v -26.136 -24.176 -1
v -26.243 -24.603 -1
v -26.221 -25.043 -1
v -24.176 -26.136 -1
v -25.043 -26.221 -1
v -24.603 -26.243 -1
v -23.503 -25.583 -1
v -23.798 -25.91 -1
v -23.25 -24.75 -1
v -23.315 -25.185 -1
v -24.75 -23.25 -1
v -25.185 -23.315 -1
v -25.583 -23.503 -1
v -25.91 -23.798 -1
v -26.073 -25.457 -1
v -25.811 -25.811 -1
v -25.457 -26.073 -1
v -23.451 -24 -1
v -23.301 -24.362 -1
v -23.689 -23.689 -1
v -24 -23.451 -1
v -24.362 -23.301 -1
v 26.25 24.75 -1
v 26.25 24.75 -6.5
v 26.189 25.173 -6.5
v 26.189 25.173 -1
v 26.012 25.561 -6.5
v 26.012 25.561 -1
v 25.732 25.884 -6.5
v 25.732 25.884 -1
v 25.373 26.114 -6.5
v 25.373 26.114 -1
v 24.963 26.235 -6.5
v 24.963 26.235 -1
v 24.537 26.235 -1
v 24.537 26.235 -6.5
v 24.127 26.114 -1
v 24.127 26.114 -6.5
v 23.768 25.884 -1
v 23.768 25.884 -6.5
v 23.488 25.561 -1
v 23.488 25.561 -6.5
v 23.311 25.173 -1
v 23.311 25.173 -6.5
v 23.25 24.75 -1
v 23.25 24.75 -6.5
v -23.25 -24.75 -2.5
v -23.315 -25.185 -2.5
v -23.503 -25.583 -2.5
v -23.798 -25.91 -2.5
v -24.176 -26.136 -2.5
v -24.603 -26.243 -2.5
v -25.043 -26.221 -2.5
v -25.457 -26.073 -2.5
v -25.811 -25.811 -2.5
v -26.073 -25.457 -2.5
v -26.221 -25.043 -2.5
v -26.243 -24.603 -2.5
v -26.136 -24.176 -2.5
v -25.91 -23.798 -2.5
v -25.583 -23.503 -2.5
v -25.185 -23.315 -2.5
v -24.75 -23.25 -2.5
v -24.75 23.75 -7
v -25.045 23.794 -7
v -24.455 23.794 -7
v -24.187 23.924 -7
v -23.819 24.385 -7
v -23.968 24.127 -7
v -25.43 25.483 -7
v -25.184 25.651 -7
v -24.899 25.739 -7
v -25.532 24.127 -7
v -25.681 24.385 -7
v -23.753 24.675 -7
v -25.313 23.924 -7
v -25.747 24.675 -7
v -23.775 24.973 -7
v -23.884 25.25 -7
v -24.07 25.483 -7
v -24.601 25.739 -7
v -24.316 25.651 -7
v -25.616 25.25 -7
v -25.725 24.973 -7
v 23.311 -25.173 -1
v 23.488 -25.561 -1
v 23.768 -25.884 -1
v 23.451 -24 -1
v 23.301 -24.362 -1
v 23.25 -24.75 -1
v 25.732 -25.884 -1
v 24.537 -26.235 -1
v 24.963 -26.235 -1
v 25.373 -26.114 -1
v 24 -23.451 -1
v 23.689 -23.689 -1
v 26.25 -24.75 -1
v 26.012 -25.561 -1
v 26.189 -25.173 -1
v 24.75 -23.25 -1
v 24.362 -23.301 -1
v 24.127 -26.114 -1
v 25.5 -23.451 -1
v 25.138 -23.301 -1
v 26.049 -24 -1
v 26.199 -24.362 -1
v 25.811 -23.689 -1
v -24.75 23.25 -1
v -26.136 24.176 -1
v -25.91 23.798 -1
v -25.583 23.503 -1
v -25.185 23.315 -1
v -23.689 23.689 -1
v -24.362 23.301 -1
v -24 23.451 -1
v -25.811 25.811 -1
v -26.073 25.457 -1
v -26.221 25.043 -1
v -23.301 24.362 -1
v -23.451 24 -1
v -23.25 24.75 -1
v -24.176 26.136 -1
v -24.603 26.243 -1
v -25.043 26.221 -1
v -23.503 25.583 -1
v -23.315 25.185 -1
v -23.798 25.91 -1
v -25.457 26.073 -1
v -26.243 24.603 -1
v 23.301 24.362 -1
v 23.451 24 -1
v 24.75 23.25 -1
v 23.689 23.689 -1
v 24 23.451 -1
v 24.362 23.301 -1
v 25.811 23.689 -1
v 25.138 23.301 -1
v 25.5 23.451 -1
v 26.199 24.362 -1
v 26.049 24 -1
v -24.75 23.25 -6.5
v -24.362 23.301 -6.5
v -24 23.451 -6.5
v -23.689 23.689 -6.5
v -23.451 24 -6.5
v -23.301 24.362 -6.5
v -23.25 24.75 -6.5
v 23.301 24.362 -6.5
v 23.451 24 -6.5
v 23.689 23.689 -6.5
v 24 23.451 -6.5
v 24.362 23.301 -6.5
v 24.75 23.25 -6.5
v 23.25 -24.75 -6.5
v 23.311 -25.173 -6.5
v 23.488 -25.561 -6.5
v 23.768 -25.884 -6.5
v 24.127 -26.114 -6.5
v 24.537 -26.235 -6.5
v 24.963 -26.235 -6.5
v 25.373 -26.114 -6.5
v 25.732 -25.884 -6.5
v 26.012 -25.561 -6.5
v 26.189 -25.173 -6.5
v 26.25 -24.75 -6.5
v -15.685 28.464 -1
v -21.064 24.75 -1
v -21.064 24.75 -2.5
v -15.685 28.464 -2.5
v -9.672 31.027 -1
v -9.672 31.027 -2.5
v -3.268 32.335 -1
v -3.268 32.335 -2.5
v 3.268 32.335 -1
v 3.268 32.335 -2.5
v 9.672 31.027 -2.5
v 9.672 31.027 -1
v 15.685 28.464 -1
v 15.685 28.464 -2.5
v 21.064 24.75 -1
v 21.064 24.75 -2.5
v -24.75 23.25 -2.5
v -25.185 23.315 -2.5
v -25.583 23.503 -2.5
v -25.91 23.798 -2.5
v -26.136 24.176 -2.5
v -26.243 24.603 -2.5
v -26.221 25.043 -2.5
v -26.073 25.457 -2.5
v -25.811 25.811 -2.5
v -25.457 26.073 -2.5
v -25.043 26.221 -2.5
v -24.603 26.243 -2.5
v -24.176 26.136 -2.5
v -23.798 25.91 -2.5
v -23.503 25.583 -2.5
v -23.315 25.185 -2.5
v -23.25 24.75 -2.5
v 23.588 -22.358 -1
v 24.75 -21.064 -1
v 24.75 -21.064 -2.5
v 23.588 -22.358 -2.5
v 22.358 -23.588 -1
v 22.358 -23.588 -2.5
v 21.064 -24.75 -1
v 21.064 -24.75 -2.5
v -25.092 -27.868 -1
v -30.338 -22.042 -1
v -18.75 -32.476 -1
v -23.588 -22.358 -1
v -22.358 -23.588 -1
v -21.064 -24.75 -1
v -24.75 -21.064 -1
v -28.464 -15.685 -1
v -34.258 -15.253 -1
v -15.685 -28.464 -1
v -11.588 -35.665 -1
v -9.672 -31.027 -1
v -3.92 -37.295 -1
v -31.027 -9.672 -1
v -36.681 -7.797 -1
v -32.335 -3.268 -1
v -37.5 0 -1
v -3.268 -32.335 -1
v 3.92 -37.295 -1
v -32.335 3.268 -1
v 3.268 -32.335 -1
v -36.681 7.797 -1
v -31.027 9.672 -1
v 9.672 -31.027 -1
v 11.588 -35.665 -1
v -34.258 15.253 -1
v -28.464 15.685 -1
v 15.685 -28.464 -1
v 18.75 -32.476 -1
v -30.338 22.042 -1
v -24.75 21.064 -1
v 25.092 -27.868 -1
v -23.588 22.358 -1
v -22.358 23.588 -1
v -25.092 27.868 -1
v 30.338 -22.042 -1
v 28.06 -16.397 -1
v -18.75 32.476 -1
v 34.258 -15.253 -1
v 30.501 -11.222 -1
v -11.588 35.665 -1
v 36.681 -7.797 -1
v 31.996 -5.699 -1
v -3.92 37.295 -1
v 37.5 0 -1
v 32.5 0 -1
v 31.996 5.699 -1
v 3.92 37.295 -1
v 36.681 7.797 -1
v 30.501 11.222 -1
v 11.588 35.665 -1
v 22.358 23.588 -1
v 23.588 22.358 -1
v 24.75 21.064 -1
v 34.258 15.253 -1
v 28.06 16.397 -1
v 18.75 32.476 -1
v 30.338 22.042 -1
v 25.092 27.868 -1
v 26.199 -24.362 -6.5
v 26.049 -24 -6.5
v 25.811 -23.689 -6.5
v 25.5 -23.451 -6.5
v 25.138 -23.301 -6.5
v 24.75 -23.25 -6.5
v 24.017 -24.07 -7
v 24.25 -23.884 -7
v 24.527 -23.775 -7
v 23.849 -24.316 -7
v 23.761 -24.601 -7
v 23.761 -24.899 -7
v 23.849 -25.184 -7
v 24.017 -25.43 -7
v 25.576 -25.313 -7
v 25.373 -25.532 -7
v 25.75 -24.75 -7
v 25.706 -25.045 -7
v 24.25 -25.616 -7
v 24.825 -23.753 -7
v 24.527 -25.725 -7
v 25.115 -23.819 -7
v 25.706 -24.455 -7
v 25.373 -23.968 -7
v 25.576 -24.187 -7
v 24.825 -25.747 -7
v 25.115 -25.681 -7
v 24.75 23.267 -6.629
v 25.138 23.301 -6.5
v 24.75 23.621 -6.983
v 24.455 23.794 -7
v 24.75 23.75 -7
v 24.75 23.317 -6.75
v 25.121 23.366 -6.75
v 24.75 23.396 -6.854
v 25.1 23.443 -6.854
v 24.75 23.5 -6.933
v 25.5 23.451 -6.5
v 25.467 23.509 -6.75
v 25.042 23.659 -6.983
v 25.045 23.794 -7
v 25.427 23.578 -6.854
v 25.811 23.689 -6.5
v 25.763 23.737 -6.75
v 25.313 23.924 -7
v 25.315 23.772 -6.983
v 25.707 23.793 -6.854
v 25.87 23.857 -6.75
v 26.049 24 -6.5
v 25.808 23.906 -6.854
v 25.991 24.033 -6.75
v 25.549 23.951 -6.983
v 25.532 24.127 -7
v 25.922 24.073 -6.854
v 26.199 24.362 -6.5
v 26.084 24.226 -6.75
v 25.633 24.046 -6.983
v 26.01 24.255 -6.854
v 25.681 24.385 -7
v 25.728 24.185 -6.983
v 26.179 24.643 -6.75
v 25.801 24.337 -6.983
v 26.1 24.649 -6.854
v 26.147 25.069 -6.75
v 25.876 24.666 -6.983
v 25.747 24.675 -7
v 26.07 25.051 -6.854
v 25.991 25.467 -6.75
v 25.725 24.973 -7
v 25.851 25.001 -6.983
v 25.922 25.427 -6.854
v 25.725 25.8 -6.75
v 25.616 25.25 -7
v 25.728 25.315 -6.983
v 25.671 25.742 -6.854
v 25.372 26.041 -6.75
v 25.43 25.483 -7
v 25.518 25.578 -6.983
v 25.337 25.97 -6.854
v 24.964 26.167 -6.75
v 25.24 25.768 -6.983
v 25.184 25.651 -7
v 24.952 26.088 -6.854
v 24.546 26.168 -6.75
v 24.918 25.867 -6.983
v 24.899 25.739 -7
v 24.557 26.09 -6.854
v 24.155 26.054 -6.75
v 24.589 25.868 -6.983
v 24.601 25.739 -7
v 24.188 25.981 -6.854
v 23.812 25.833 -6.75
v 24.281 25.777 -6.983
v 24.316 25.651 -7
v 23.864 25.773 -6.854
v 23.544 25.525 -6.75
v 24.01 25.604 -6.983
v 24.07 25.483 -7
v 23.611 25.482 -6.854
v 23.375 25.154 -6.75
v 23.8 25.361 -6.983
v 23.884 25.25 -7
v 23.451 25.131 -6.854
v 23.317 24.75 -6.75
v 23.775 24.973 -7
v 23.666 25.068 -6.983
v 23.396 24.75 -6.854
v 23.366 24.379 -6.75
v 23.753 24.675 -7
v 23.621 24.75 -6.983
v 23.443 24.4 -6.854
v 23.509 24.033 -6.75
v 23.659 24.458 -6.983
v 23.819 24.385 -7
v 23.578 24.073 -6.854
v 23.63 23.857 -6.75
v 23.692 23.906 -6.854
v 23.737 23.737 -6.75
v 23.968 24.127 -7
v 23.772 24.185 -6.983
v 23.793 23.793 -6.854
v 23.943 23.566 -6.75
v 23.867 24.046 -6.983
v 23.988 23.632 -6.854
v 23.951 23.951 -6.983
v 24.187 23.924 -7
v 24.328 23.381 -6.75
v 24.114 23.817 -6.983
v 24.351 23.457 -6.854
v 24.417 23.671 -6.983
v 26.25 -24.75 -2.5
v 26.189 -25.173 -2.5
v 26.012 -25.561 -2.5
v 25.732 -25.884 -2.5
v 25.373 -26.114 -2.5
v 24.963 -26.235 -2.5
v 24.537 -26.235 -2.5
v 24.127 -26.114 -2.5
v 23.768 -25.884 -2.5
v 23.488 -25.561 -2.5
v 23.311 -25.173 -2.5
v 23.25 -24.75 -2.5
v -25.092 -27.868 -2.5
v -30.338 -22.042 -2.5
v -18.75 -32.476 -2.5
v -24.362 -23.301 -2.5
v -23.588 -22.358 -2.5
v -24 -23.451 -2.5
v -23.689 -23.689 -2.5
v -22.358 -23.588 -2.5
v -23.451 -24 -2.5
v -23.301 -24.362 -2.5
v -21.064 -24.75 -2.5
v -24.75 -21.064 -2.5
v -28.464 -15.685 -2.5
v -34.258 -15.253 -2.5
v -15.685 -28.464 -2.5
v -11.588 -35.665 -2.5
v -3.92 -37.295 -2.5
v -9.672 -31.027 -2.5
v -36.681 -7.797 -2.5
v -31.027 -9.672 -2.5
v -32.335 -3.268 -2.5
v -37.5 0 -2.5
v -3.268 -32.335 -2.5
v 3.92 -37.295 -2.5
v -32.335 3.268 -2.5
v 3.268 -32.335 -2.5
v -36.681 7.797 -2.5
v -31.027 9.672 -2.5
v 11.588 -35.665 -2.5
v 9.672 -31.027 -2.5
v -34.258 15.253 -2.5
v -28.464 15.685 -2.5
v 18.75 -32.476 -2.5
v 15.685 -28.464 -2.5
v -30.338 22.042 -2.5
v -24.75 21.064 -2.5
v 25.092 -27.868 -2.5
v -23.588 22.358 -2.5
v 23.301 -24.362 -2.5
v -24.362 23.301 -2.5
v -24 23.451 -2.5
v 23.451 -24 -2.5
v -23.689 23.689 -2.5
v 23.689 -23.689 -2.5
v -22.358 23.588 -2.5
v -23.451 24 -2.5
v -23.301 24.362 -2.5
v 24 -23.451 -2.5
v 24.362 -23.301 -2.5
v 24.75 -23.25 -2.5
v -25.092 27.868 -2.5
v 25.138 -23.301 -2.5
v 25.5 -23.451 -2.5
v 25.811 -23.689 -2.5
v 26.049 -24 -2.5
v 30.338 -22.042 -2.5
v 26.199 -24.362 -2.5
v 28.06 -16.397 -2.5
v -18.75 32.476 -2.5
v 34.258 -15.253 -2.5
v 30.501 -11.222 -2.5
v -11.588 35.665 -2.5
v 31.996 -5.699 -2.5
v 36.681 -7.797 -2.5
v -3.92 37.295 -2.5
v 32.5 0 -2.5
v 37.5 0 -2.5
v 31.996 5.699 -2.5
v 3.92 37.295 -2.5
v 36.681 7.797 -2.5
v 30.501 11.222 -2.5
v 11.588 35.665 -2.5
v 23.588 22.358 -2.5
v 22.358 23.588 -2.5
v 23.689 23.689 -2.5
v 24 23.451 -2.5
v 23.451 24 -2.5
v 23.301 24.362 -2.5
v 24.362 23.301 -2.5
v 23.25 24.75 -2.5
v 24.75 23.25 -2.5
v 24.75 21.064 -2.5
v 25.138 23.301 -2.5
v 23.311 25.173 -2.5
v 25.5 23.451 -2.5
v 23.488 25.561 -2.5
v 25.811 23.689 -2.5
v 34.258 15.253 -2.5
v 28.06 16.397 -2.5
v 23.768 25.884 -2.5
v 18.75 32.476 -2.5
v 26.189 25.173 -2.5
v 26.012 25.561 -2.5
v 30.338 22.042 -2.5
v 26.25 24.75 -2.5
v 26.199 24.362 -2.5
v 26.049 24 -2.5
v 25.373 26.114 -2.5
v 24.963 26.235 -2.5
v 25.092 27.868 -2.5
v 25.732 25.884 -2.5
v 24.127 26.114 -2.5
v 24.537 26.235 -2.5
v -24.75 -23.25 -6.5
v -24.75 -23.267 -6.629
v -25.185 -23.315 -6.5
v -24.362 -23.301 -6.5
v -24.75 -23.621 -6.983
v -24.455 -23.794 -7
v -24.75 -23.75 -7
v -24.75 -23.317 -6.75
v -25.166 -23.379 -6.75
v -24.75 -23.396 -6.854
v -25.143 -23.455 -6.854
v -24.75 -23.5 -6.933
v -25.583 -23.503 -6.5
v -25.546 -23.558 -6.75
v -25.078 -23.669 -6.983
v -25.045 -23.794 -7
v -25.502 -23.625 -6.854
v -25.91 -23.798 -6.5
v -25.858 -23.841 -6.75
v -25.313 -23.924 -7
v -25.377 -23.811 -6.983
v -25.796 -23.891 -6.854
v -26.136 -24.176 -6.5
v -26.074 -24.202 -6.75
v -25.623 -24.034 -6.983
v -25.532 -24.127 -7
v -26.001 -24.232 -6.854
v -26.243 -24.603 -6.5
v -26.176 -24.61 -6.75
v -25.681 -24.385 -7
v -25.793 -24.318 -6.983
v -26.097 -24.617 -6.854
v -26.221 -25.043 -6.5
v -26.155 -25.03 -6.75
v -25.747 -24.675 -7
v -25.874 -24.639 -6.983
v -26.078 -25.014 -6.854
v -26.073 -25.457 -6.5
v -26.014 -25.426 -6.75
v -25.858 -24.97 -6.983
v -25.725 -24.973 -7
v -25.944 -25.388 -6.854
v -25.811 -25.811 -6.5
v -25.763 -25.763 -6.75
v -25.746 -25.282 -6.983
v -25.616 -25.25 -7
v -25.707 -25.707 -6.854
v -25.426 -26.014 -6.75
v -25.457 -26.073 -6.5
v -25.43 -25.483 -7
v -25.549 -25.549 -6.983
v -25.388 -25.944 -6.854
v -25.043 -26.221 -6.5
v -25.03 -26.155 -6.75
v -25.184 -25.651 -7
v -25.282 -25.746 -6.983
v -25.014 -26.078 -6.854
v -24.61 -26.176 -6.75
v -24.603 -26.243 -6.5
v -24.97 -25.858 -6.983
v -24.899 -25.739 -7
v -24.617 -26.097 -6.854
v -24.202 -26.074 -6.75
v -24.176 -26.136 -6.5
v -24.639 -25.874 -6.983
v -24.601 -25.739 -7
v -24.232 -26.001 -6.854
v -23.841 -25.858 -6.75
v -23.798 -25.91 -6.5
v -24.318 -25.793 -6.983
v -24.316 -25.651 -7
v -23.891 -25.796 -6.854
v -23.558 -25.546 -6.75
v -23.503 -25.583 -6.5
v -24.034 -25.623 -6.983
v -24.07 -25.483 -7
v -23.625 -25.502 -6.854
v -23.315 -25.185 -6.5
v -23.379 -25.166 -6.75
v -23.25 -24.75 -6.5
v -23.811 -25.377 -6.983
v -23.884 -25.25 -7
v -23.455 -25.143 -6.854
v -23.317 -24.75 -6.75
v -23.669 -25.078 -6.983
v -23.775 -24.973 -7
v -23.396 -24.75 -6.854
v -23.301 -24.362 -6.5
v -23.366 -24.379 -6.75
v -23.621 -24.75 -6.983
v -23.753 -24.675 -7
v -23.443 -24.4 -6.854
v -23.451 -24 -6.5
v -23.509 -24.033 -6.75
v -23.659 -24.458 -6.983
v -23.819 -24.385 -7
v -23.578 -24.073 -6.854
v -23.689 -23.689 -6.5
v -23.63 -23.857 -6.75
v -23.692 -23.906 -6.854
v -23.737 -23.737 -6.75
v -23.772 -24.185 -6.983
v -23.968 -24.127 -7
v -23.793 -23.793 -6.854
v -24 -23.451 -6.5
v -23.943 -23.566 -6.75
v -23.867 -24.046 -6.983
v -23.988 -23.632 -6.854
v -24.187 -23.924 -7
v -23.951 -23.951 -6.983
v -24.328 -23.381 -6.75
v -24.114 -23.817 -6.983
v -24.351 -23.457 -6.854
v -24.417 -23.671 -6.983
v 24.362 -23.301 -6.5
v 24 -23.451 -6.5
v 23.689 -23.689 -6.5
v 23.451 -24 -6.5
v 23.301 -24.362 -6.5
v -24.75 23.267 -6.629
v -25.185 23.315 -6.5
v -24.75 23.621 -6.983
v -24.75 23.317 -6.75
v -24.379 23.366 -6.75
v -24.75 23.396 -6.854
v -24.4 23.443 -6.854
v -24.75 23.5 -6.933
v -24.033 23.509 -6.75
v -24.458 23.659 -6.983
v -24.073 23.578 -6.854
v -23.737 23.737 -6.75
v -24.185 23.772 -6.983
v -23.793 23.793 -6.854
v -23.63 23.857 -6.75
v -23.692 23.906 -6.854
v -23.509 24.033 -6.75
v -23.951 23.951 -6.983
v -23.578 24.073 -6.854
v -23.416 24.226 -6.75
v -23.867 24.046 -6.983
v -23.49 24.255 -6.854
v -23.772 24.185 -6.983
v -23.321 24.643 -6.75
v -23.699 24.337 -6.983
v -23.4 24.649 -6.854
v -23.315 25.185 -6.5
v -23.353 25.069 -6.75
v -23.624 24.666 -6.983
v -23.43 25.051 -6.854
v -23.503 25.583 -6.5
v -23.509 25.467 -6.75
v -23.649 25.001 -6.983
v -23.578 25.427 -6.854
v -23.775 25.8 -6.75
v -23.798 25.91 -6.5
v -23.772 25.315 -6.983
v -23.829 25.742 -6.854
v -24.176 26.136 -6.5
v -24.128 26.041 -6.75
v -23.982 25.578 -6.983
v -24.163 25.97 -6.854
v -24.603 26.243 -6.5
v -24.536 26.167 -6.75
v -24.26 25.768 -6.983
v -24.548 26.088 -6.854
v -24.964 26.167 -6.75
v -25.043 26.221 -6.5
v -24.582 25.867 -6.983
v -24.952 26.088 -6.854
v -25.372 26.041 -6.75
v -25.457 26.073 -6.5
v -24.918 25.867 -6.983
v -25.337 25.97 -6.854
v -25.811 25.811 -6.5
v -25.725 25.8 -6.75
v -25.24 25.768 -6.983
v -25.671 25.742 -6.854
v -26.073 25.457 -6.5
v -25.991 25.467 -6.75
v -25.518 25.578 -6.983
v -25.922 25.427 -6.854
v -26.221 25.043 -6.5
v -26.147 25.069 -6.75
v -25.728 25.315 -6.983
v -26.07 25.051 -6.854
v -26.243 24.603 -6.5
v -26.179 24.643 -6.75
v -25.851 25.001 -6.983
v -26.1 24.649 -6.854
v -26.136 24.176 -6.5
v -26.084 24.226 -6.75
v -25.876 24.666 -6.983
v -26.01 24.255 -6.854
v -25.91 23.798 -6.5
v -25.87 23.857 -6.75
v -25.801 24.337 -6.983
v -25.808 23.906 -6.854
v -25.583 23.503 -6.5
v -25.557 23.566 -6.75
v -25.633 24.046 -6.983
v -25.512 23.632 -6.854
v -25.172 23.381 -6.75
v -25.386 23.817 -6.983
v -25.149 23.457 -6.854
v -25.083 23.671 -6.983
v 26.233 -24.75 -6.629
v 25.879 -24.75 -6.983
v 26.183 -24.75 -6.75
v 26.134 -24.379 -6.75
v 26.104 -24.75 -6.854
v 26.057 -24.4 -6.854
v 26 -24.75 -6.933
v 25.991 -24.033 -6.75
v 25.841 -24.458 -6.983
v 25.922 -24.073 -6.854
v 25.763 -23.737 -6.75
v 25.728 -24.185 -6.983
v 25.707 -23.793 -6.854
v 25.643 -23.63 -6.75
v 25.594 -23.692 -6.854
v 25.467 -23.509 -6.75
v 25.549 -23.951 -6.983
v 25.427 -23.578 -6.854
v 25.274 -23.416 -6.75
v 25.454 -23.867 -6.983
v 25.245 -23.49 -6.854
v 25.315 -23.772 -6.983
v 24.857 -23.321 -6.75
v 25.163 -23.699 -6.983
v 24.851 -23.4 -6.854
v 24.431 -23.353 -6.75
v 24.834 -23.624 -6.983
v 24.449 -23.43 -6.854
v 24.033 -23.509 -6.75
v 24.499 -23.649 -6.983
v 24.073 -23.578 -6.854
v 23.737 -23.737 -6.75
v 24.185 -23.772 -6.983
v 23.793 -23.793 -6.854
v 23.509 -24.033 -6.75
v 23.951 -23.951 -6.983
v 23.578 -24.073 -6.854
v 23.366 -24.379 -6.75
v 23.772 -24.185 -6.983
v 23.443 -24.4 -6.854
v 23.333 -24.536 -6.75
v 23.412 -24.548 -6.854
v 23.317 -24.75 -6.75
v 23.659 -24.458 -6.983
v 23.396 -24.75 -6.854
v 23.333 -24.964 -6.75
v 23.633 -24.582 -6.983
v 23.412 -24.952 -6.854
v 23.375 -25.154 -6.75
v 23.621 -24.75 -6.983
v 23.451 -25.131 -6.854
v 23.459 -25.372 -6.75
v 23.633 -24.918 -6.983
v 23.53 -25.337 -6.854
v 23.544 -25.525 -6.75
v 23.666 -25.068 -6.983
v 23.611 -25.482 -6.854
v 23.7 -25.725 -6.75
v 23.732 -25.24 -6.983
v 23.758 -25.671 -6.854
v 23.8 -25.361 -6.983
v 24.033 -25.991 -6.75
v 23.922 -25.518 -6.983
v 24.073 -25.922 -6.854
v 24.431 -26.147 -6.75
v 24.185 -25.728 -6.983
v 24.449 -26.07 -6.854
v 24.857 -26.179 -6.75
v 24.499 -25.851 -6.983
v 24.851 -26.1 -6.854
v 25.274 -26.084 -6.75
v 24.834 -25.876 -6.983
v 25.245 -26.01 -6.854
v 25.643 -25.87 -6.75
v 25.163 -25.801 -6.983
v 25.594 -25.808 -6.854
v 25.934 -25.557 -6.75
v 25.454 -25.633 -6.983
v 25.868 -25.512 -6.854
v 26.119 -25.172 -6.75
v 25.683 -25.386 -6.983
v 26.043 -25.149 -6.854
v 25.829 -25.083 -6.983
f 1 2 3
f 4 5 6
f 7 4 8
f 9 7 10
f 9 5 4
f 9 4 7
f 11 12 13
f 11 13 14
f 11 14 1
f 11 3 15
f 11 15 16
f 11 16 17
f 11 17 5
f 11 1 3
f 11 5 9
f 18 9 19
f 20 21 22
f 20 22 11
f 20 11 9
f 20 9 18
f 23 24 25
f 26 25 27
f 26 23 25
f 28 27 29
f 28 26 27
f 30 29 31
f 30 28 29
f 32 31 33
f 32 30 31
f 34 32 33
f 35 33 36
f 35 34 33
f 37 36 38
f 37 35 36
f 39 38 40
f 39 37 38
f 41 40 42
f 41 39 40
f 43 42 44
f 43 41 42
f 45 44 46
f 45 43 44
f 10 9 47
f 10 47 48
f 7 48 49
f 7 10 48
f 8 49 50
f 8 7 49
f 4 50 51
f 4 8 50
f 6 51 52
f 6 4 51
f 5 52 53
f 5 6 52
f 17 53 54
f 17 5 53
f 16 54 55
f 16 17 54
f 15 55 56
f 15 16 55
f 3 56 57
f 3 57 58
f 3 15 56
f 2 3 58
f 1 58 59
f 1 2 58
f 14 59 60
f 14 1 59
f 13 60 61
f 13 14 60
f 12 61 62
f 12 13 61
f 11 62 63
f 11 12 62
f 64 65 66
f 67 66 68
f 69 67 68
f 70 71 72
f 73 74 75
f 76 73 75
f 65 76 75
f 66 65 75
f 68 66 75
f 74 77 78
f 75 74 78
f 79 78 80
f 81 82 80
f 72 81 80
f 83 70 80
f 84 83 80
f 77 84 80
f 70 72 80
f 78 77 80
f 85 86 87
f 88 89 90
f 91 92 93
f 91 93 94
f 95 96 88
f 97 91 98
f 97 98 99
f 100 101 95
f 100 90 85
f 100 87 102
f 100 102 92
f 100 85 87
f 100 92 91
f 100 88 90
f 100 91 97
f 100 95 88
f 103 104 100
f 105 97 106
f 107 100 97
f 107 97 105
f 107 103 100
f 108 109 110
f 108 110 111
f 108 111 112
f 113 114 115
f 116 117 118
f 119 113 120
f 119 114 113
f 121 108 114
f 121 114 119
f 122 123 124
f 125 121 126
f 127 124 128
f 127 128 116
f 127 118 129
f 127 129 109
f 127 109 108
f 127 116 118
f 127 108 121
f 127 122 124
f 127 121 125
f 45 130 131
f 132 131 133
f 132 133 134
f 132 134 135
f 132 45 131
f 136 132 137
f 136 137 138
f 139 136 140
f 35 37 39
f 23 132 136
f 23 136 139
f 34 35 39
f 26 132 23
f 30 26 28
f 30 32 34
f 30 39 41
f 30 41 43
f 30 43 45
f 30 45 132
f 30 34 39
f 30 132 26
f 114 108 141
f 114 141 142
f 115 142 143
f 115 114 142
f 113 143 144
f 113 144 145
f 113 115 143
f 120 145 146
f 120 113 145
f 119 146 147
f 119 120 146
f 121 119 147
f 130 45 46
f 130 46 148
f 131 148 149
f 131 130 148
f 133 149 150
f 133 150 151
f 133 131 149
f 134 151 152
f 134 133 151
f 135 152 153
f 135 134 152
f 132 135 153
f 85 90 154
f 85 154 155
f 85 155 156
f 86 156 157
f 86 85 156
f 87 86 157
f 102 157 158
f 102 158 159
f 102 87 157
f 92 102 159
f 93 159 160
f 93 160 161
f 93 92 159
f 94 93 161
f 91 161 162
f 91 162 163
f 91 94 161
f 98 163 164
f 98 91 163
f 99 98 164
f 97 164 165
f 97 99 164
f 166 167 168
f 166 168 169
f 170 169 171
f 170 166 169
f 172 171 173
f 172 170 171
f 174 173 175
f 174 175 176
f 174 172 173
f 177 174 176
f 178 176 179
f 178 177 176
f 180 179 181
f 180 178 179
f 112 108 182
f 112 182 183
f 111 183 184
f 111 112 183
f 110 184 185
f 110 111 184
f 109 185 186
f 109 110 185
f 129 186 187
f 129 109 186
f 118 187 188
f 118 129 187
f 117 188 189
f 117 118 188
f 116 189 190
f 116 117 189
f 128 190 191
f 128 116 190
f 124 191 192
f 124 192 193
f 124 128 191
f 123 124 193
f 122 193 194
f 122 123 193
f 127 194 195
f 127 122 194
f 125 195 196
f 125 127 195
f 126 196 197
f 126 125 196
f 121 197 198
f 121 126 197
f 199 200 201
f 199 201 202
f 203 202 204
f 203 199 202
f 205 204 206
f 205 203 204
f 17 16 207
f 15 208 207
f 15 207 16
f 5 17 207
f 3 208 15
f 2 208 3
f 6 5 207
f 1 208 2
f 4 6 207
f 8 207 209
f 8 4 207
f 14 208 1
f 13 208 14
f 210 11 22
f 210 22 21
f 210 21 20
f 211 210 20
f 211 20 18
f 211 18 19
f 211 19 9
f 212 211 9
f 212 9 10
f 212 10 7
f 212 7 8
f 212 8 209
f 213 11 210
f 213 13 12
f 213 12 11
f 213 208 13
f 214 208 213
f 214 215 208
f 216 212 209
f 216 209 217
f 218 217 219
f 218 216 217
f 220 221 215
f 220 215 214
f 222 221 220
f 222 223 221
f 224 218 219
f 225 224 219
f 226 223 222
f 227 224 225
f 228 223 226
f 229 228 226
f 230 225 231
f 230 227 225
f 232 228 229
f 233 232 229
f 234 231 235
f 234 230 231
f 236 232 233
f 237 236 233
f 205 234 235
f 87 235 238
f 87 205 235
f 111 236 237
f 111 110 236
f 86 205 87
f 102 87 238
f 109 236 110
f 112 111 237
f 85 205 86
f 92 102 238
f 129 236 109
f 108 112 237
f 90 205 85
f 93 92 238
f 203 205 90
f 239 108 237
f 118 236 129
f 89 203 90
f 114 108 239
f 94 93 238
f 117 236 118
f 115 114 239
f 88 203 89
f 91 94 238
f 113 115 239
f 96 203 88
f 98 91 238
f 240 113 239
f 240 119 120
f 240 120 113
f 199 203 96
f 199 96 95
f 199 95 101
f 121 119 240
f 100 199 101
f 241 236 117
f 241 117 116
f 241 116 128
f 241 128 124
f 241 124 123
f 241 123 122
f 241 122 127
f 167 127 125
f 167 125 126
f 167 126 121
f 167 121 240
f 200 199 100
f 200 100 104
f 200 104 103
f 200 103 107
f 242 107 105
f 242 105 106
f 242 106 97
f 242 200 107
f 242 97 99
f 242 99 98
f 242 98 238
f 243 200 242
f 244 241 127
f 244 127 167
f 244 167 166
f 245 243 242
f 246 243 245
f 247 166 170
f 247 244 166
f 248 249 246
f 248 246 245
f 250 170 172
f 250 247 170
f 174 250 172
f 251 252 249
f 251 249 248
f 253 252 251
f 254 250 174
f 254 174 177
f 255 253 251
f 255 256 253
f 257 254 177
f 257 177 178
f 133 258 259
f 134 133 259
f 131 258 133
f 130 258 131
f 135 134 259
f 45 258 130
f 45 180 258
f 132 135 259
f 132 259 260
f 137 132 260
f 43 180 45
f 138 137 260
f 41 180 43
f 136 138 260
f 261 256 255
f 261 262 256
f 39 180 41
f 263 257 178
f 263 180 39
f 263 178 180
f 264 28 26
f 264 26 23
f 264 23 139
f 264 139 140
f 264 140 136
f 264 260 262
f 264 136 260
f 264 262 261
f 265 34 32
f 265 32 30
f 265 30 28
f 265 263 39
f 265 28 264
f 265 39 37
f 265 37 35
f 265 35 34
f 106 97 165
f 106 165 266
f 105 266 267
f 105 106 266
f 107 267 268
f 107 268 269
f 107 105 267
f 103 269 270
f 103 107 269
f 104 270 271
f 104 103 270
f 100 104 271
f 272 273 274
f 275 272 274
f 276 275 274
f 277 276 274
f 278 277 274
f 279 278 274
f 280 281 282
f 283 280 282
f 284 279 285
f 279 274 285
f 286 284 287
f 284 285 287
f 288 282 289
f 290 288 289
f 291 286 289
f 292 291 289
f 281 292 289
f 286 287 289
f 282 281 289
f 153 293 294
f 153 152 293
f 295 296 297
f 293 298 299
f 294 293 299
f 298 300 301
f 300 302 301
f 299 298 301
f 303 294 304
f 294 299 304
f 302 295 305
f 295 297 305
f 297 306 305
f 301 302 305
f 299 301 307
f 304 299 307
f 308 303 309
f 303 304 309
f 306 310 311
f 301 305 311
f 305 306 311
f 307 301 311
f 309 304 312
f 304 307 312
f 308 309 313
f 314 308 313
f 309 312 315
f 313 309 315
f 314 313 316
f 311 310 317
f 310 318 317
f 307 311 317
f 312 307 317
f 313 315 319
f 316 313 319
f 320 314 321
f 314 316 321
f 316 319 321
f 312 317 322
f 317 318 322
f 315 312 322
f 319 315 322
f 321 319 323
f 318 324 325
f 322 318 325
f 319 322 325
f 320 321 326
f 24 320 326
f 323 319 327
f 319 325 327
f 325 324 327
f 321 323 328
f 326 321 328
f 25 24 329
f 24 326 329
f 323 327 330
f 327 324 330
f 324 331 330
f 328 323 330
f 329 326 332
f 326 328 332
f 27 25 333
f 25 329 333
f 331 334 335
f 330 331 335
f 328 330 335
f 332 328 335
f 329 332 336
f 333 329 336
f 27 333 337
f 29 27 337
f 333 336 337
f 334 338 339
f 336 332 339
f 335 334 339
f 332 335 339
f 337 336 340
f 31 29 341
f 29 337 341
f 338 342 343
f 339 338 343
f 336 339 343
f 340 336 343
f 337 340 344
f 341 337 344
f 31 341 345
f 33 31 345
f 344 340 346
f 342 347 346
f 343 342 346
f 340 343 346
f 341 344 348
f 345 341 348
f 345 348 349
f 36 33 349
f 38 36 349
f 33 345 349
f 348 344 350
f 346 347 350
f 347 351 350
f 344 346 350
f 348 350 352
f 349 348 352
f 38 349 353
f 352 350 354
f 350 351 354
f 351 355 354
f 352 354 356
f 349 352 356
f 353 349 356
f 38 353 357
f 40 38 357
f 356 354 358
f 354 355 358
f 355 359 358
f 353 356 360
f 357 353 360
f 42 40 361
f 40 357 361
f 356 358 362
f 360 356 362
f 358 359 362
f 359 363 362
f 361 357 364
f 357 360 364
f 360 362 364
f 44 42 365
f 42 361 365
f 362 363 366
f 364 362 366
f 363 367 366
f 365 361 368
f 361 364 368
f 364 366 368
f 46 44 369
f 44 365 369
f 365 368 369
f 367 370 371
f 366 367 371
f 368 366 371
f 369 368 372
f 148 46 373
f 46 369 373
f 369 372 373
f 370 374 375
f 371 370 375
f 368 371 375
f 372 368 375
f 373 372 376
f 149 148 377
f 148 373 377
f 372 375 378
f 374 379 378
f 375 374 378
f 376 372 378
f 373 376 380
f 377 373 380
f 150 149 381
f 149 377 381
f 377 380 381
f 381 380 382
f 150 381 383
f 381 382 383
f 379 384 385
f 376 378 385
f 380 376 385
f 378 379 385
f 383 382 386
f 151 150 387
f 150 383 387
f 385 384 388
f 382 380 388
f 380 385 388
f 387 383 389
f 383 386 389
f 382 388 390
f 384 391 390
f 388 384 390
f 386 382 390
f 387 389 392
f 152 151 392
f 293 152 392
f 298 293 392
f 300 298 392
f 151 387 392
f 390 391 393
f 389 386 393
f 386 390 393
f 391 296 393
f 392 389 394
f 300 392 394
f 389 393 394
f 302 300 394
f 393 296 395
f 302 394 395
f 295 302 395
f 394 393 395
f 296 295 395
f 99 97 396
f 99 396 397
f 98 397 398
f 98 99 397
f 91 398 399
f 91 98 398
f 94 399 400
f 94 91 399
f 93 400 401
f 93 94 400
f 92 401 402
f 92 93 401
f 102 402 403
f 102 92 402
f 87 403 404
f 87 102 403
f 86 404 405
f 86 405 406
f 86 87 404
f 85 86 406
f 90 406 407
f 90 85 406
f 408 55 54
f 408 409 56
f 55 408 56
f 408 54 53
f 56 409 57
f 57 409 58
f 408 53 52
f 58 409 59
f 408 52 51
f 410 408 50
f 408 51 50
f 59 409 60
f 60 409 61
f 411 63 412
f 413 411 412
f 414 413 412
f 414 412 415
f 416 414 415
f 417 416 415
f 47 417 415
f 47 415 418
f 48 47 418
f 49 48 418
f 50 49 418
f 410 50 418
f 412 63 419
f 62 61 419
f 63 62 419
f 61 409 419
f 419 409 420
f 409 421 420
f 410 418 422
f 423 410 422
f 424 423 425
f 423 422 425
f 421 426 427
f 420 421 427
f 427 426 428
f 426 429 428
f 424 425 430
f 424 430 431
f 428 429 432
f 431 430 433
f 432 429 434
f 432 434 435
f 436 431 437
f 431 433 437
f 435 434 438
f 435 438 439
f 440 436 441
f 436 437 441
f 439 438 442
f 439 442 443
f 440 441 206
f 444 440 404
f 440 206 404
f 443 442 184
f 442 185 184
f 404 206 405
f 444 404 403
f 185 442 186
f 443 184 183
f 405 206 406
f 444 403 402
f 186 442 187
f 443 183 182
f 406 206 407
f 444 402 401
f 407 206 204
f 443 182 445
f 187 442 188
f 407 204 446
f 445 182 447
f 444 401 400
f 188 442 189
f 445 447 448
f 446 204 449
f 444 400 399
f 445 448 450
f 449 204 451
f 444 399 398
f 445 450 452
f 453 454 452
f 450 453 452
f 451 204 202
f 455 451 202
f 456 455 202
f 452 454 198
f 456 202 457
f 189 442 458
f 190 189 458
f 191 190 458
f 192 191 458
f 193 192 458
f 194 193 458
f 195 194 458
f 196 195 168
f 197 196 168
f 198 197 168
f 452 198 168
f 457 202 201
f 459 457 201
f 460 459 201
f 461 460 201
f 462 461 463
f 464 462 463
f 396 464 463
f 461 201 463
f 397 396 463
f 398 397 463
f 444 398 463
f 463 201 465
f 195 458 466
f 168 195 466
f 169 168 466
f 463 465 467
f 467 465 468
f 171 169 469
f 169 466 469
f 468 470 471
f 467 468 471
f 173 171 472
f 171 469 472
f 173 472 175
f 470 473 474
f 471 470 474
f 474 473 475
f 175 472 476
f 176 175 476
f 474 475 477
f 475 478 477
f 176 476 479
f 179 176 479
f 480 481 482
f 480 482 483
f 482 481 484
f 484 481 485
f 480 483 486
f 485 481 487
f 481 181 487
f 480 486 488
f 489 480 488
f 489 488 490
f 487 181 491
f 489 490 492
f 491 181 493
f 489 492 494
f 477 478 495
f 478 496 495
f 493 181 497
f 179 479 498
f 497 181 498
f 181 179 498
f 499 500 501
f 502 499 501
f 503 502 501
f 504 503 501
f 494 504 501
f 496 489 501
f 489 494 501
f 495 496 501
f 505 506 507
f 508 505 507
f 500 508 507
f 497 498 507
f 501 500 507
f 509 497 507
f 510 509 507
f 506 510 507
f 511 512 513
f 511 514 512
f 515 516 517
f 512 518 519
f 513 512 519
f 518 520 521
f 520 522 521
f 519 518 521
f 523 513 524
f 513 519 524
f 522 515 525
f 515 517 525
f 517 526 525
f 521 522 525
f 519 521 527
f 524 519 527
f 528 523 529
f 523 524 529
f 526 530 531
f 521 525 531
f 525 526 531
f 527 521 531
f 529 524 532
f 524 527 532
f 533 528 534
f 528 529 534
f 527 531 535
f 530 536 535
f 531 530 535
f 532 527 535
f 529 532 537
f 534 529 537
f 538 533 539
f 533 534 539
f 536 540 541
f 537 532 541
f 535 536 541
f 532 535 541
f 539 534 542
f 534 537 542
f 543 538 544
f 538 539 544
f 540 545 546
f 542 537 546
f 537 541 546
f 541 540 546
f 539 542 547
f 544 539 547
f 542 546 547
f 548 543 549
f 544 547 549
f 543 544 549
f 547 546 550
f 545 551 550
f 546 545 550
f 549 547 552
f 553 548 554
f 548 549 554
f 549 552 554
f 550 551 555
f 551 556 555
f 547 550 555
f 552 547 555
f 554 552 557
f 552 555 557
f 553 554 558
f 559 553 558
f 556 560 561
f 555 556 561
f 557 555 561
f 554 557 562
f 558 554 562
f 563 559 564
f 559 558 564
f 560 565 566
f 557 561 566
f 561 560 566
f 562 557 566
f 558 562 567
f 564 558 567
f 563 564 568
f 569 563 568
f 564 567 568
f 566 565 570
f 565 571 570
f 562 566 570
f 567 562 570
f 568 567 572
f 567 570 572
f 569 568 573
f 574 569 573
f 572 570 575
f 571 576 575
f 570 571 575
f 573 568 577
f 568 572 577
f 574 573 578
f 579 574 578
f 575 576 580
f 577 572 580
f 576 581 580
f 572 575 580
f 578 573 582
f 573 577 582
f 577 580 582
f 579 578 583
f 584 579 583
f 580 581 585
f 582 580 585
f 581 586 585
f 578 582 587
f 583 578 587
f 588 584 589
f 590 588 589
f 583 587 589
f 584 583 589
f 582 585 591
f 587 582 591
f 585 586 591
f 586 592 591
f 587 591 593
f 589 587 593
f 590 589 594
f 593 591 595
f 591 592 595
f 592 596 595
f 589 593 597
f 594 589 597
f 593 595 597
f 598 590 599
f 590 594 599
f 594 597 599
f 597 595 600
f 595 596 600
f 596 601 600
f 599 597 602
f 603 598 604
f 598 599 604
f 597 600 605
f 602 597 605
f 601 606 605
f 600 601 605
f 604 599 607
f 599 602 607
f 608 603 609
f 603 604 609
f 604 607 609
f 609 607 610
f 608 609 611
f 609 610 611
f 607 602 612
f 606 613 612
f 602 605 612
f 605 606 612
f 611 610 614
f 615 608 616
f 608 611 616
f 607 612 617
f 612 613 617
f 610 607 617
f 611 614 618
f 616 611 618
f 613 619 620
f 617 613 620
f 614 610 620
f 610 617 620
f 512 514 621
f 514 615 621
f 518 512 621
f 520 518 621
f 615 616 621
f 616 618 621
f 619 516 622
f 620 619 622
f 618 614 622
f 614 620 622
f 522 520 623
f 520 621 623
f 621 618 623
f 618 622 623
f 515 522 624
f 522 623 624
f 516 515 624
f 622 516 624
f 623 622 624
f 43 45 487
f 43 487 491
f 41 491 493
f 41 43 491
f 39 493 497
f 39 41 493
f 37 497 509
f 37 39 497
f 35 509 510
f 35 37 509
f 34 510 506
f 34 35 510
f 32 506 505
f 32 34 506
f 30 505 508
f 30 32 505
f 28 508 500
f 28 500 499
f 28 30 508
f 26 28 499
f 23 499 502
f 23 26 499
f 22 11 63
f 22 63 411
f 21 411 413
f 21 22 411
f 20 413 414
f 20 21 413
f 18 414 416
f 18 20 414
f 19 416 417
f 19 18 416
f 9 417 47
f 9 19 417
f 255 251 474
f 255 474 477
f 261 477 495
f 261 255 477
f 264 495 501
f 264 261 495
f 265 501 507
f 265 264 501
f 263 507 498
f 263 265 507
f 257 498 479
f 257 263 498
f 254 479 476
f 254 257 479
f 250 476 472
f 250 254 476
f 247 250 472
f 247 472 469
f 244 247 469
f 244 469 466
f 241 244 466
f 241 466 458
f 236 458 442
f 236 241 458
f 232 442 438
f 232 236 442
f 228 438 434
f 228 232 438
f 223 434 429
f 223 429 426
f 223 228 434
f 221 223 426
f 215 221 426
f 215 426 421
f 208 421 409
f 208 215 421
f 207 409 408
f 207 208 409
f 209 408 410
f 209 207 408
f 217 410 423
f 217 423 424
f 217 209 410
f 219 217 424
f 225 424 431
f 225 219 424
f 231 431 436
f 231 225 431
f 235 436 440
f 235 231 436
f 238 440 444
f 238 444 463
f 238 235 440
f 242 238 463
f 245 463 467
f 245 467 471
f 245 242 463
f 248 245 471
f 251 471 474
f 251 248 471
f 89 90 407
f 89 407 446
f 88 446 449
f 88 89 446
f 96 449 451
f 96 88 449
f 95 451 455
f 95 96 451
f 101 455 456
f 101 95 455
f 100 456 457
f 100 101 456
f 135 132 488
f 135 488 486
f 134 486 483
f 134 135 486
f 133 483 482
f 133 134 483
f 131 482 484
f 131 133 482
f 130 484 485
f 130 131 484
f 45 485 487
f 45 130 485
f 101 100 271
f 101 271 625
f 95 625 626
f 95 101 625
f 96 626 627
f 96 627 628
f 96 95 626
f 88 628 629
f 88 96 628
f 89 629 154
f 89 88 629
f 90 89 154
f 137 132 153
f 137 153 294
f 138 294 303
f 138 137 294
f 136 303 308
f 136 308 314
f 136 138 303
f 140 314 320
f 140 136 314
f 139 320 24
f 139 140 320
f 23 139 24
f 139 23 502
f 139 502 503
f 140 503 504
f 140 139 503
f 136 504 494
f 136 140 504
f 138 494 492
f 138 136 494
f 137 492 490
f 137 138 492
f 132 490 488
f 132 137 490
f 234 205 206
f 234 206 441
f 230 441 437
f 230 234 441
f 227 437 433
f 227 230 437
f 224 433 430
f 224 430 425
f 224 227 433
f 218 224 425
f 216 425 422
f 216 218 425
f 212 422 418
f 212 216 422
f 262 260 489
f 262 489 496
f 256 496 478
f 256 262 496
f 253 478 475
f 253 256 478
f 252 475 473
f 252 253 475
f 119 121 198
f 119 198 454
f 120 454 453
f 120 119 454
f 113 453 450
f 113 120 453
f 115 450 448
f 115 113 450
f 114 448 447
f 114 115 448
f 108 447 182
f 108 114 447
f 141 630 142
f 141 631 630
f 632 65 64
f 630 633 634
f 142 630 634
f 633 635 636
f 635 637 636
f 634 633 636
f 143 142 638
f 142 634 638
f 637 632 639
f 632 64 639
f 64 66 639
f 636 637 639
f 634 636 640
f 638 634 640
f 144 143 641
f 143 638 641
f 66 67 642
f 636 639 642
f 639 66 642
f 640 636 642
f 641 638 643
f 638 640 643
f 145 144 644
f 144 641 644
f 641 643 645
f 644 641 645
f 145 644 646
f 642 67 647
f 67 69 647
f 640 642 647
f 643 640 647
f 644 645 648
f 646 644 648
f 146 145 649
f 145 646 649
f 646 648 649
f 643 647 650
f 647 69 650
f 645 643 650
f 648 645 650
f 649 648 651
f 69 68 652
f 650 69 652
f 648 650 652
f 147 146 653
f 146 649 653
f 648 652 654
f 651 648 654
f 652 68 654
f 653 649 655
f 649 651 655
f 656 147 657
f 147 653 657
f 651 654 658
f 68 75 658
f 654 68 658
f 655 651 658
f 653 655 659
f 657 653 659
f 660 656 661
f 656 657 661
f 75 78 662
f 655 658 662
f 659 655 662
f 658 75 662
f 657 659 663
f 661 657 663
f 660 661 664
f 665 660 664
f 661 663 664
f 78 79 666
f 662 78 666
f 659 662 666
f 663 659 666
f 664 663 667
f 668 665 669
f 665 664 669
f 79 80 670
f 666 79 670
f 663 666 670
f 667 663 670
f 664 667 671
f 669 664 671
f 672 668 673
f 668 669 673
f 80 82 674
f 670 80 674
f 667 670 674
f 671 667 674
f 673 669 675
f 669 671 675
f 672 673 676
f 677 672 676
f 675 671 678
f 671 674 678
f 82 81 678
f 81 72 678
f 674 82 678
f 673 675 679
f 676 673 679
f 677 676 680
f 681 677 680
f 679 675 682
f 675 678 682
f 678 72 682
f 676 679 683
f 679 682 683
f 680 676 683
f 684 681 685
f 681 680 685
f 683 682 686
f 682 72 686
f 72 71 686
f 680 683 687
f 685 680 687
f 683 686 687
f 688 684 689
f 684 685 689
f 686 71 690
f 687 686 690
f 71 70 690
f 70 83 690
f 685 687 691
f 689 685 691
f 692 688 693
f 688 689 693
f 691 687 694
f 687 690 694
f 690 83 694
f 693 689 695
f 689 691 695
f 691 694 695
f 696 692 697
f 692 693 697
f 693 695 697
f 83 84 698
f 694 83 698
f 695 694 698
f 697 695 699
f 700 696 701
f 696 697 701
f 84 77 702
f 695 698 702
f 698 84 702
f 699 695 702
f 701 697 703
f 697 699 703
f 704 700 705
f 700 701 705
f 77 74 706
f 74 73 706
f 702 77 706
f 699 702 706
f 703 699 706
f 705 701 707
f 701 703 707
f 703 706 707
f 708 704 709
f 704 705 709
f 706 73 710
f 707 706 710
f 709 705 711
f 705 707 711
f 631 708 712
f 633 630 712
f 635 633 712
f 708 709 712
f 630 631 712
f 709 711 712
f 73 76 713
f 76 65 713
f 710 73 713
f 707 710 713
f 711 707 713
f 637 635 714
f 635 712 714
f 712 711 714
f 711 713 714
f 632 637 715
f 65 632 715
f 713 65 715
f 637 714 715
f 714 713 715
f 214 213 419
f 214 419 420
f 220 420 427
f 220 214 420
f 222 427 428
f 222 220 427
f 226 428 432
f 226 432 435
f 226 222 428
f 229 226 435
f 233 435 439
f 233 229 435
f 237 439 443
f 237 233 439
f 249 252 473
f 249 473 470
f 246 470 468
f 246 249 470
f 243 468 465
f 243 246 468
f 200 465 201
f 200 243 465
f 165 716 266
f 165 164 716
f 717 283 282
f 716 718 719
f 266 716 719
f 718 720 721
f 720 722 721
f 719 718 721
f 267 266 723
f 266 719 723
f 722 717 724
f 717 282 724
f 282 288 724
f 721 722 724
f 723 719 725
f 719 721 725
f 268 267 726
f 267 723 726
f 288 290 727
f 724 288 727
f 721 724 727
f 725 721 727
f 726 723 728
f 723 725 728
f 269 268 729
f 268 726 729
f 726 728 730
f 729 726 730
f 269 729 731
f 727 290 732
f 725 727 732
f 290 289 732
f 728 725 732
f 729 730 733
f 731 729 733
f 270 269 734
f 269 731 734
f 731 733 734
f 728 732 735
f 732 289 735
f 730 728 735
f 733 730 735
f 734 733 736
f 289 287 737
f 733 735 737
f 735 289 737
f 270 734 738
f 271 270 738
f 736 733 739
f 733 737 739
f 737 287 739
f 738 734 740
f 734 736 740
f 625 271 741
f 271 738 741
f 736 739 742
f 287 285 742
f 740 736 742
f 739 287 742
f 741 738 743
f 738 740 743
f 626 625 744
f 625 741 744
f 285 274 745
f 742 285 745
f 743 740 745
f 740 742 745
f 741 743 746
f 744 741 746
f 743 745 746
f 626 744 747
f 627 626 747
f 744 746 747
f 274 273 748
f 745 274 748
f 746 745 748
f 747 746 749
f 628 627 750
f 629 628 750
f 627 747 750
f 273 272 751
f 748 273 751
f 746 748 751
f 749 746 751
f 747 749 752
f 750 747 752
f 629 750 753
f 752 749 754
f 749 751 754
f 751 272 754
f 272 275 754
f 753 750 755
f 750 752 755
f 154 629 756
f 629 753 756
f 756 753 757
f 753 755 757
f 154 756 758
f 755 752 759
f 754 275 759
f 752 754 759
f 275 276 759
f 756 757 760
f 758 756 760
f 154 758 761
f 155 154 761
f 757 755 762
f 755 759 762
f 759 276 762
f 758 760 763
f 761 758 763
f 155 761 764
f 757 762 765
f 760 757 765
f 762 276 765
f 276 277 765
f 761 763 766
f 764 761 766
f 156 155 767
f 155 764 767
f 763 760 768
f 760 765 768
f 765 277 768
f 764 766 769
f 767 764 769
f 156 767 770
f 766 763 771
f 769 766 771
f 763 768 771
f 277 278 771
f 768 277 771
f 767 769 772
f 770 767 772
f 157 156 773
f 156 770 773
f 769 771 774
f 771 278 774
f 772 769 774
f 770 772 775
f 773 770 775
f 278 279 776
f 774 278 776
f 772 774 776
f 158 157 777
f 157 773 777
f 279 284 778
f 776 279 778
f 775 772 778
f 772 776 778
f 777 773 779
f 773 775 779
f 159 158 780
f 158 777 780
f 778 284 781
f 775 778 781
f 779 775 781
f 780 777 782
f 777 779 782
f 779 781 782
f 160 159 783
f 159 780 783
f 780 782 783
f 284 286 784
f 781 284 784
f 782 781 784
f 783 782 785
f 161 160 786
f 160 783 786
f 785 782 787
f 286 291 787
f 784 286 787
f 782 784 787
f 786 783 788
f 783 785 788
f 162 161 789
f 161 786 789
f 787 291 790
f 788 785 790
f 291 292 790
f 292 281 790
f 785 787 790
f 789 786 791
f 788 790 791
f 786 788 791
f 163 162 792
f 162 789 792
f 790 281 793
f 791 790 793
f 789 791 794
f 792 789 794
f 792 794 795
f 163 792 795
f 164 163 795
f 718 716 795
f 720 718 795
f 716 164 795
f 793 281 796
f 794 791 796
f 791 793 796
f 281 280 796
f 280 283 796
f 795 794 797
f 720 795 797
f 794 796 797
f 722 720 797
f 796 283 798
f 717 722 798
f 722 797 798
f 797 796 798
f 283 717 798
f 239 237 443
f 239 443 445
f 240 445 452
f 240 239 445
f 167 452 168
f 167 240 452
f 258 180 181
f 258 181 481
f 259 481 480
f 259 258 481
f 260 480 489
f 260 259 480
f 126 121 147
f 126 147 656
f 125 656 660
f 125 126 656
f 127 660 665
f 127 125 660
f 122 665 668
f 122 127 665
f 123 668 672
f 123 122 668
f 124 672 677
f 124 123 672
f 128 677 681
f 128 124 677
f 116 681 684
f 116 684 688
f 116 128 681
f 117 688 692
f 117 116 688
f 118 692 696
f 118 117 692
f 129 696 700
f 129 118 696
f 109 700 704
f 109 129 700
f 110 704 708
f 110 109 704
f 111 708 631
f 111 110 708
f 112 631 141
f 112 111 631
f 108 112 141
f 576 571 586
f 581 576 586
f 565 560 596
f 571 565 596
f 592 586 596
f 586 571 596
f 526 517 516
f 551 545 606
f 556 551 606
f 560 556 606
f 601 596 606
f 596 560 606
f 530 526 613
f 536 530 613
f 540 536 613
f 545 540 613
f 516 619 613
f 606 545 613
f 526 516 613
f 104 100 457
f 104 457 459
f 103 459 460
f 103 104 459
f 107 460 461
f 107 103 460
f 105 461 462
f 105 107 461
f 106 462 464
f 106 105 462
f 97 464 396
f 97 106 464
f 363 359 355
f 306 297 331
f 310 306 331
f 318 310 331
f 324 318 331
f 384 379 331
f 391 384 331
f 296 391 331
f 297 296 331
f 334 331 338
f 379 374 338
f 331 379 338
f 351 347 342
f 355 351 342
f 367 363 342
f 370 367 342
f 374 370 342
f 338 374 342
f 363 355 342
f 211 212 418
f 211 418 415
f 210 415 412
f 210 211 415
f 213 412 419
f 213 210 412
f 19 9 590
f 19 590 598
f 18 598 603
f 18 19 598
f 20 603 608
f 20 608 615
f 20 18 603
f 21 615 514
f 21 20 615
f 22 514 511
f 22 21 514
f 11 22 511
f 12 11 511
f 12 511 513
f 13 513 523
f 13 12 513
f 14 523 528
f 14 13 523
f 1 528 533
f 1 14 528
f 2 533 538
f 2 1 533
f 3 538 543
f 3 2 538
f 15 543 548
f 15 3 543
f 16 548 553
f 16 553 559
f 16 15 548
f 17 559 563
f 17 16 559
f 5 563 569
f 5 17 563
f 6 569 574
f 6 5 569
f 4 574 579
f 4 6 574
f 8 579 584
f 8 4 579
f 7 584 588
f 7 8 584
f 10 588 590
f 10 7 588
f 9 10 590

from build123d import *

# Parameters (mm, degrees)
F2_DEPTH = 6
F1_R     = 37.5
F4_DEPTH = 1.5


# Not quite as in the source:
# - a fillet or chamfer that OpenCascade refuses, or shapes differently, is made with other operations: its cross-section is extruded or revolved along the edge and cut away or added


with BuildPart() as f2:
    # F1 (on offset) → F2 (new body)
    with BuildSketch(Plane.XY.offset(-1)):
        with BuildLine():
            Line((-24.75, 24.75), (-23.25, 24.75))
            ThreePointArc((-23.25, 24.75), (-25.8106601718, 25.8106601718), (-24.75, 23.25))
            Line((-24.75, 23.25), (-24.75, 24.75))
        make_face()
        with BuildLine():
            ThreePointArc((-24.75, 23.25), (-23.6893398282, 23.6893398282), (-23.25, 24.75))
            Line((-23.25, 24.75), (-24.75, 24.75))
            Line((-24.75, 24.75), (-24.75, 23.25))
        make_face()
    extrude(amount=-F2_DEPTH)

    # F3: fillet of radius 0.5 on 1 edges, made by hand

    # F3_s1 → F3_t2 (revolve, cut)
    with BuildSketch(Plane.YZ.offset(-24.75)):
        with BuildLine():
            ThreePointArc((23.25, -6.5), (23.3964466094, -6.8535533906), (23.75, -7))
            Line((23.75, -7), (23.25, -7))
            Line((23.25, -7), (23.25, -6.5))
        make_face()
    revolve(axis=Axis((-24.75, 24.75, -7), (0, 0, 1)), mode=Mode.SUBTRACT)


with BuildPart() as f2b:
    # F1 (on offset) → F2, piece 2 (new body)
    with BuildSketch(Plane.XY.offset(-1)):
        with BuildLine():
            ThreePointArc((23.25, 24.75), (23.6893398282, 23.6893398282), (24.75, 23.25))
            Line((24.75, 23.25), (24.75, 24.75))
            Line((24.75, 24.75), (23.25, 24.75))
        make_face()
        with BuildLine():
            Line((24.75, 24.75), (24.75, 23.25))
            ThreePointArc((24.75, 23.25), (25.8106601718, 23.6893398282), (26.25, 24.75))
            ThreePointArc((26.25, 24.75), (24.75, 26.25), (23.25, 24.75))
            Line((23.25, 24.75), (24.75, 24.75))
        make_face()
    extrude(amount=-F2_DEPTH)

    # F3#2: fillet of radius 0.5 on 1 edges, made by hand

    # F3_2_s1 → F3_2_t2 (revolve, cut)
    with BuildSketch(Plane.YZ.offset(24.75)):
        with BuildLine():
            ThreePointArc((23.25, -6.5), (23.3964466094, -6.8535533906), (23.75, -7))
            Line((23.75, -7), (23.25, -7))
            Line((23.25, -7), (23.25, -6.5))
        make_face()
    revolve(axis=Axis((24.75, 24.75, -7), (0, 0, 1)), mode=Mode.SUBTRACT)


with BuildPart() as f2c:
    # F1 (on offset) → F2, piece 3 (new body)
    with BuildSketch(Plane.XY.offset(-1)):
        with BuildLine():
            ThreePointArc((26.25, -24.75), (25.8106601718, -23.6893398282), (24.75, -23.25))
            Line((24.75, -23.25), (24.75, -24.75))
            Line((24.75, -24.75), (23.25, -24.75))
            ThreePointArc((23.25, -24.75), (24.75, -26.25), (26.25, -24.75))
        make_face()
        with BuildLine():
            Line((24.75, -24.75), (24.75, -23.25))
            ThreePointArc((24.75, -23.25), (23.6893398282, -23.6893398282), (23.25, -24.75))
            Line((23.25, -24.75), (24.75, -24.75))
        make_face()
    extrude(amount=-F2_DEPTH)

    # F3#3: fillet of radius 0.5 on 1 edges, made by hand

    # F3_3_s1 → F3_3_t2 (revolve, cut)
    with BuildSketch(Plane.XZ.offset(24.75)):
        with BuildLine():
            ThreePointArc((26.25, -6.5), (26.1035533906, -6.8535533906), (25.75, -7))
            Line((25.75, -7), (26.25, -7))
            Line((26.25, -7), (26.25, -6.5))
        make_face()
    revolve(axis=Axis((24.75, -24.75, -7), (0, 0, 1)), mode=Mode.SUBTRACT)


with BuildPart() as f2d:
    # F1 (on offset) → F2, piece 4 (new body)
    with BuildSketch(Plane.XY.offset(-1)):
        with BuildLine():
            Line((-24.75, -24.75), (-23.25, -24.75))
            ThreePointArc((-23.25, -24.75), (-23.6893398282, -23.6893398282), (-24.75, -23.25))
            Line((-24.75, -23.25), (-24.75, -24.75))
        make_face()
        with BuildLine():
            ThreePointArc((-24.75, -23.25), (-25.8106601718, -25.8106601718), (-23.25, -24.75))
            Line((-23.25, -24.75), (-24.75, -24.75))
            Line((-24.75, -24.75), (-24.75, -23.25))
        make_face()
    extrude(amount=-F2_DEPTH)

    # F3#4: fillet of radius 0.5 on 1 edges, made by hand

    # F3_4_s1 → F3_4_t2 (revolve, cut)
    with BuildSketch(Plane.YZ.offset(-24.75)):
        with BuildLine():
            ThreePointArc((-23.25, -6.5), (-23.3964466094, -6.8535533906), (-23.75, -7))
            Line((-23.75, -7), (-23.25, -7))
            Line((-23.25, -7), (-23.25, -6.5))
        make_face()
    revolve(axis=Axis((-24.75, -24.75, -7), (0, 0, 1)), mode=Mode.SUBTRACT)


with BuildPart() as f4:
    # F1 (on offset) → F4 (new body)
    with BuildSketch(Plane.XY.offset(-1)):
        Circle(F1_R)
        with BuildLine():
            ThreePointArc((24.75, 21.0638909036), (30.501024573, 11.2221878437), (32.5, 0))
            ThreePointArc((32.5, 0), (30.501024573, -11.2221878437), (24.75, -21.0638909036))
            Line((24.75, -21.0638909036), (24.75, -23.25))
            ThreePointArc((24.75, -23.25), (25.8106601718, -23.6893398282), (26.25, -24.75))
            ThreePointArc((26.25, -24.75), (24.75, -26.25), (23.25, -24.75))
            Line((23.25, -24.75), (21.0638909036, -24.75))
            ThreePointArc((21.0638909036, -24.75), (0, -32.5), (-21.0638909036, -24.75))
            Line((-21.0638909036, -24.75), (-23.25, -24.75))
            ThreePointArc((-23.25, -24.75), (-25.8106601718, -25.8106601718), (-24.75, -23.25))
            Line((-24.75, -23.25), (-24.75, -21.0638909036))
            ThreePointArc((-24.75, -21.0638909036), (-32.5, 0), (-24.75, 21.0638909036))
            Line((-24.75, 21.0638909036), (-24.75, 23.25))
            ThreePointArc((-24.75, 23.25), (-25.8106601718, 25.8106601718), (-23.25, 24.75))
            Line((-23.25, 24.75), (-21.0638909036, 24.75))
            ThreePointArc((-21.0638909036, 24.75), (0, 32.5), (21.0638909036, 24.75))
            Line((21.0638909036, 24.75), (23.25, 24.75))
            ThreePointArc((23.25, 24.75), (24.75, 26.25), (26.25, 24.75))
            ThreePointArc((26.25, 24.75), (25.8106601718, 23.6893398282), (24.75, 23.25))
            Line((24.75, 23.25), (24.75, 21.0638909036))
        make_face(mode=Mode.SUBTRACT)
        with BuildLine():
            Line((-23.25, -24.75), (-21.0638909036, -24.75))
            ThreePointArc((-21.0638909036, -24.75), (-22.9809703886, -22.9809703886), (-24.75, -21.0638909036))
            Line((-24.75, -21.0638909036), (-24.75, -23.25))
            ThreePointArc((-24.75, -23.25), (-23.6893398282, -23.6893398282), (-23.25, -24.75))
        make_face()
        with BuildLine():
            ThreePointArc((-24.75, 21.0638909036), (-22.9809703886, 22.9809703886), (-21.0638909036, 24.75))
            Line((-21.0638909036, 24.75), (-23.25, 24.75))
            ThreePointArc((-23.25, 24.75), (-23.6893398282, 23.6893398282), (-24.75, 23.25))
            Line((-24.75, 23.25), (-24.75, 21.0638909036))
        make_face()
        with BuildLine():
            ThreePointArc((21.0638909036, 24.75), (22.9809703886, 22.9809703886), (24.75, 21.0638909036))
            Line((24.75, 21.0638909036), (24.75, 23.25))
            ThreePointArc((24.75, 23.25), (23.6893398282, 23.6893398282), (23.25, 24.75))
            Line((23.25, 24.75), (21.0638909036, 24.75))
        make_face()
        with BuildLine():
            Line((24.75, -23.25), (24.75, -21.0638909036))
            ThreePointArc((24.75, -21.0638909036), (22.9809703886, -22.9809703886), (21.0638909036, -24.75))
            Line((21.0638909036, -24.75), (23.25, -24.75))
            ThreePointArc((23.25, -24.75), (23.6893398282, -23.6893398282), (24.75, -23.25))
        make_face()
    extrude(amount=-F4_DEPTH)


solid = Compound([f2.part, f2b.part, f2c.part, f2d.part, f4.part])
